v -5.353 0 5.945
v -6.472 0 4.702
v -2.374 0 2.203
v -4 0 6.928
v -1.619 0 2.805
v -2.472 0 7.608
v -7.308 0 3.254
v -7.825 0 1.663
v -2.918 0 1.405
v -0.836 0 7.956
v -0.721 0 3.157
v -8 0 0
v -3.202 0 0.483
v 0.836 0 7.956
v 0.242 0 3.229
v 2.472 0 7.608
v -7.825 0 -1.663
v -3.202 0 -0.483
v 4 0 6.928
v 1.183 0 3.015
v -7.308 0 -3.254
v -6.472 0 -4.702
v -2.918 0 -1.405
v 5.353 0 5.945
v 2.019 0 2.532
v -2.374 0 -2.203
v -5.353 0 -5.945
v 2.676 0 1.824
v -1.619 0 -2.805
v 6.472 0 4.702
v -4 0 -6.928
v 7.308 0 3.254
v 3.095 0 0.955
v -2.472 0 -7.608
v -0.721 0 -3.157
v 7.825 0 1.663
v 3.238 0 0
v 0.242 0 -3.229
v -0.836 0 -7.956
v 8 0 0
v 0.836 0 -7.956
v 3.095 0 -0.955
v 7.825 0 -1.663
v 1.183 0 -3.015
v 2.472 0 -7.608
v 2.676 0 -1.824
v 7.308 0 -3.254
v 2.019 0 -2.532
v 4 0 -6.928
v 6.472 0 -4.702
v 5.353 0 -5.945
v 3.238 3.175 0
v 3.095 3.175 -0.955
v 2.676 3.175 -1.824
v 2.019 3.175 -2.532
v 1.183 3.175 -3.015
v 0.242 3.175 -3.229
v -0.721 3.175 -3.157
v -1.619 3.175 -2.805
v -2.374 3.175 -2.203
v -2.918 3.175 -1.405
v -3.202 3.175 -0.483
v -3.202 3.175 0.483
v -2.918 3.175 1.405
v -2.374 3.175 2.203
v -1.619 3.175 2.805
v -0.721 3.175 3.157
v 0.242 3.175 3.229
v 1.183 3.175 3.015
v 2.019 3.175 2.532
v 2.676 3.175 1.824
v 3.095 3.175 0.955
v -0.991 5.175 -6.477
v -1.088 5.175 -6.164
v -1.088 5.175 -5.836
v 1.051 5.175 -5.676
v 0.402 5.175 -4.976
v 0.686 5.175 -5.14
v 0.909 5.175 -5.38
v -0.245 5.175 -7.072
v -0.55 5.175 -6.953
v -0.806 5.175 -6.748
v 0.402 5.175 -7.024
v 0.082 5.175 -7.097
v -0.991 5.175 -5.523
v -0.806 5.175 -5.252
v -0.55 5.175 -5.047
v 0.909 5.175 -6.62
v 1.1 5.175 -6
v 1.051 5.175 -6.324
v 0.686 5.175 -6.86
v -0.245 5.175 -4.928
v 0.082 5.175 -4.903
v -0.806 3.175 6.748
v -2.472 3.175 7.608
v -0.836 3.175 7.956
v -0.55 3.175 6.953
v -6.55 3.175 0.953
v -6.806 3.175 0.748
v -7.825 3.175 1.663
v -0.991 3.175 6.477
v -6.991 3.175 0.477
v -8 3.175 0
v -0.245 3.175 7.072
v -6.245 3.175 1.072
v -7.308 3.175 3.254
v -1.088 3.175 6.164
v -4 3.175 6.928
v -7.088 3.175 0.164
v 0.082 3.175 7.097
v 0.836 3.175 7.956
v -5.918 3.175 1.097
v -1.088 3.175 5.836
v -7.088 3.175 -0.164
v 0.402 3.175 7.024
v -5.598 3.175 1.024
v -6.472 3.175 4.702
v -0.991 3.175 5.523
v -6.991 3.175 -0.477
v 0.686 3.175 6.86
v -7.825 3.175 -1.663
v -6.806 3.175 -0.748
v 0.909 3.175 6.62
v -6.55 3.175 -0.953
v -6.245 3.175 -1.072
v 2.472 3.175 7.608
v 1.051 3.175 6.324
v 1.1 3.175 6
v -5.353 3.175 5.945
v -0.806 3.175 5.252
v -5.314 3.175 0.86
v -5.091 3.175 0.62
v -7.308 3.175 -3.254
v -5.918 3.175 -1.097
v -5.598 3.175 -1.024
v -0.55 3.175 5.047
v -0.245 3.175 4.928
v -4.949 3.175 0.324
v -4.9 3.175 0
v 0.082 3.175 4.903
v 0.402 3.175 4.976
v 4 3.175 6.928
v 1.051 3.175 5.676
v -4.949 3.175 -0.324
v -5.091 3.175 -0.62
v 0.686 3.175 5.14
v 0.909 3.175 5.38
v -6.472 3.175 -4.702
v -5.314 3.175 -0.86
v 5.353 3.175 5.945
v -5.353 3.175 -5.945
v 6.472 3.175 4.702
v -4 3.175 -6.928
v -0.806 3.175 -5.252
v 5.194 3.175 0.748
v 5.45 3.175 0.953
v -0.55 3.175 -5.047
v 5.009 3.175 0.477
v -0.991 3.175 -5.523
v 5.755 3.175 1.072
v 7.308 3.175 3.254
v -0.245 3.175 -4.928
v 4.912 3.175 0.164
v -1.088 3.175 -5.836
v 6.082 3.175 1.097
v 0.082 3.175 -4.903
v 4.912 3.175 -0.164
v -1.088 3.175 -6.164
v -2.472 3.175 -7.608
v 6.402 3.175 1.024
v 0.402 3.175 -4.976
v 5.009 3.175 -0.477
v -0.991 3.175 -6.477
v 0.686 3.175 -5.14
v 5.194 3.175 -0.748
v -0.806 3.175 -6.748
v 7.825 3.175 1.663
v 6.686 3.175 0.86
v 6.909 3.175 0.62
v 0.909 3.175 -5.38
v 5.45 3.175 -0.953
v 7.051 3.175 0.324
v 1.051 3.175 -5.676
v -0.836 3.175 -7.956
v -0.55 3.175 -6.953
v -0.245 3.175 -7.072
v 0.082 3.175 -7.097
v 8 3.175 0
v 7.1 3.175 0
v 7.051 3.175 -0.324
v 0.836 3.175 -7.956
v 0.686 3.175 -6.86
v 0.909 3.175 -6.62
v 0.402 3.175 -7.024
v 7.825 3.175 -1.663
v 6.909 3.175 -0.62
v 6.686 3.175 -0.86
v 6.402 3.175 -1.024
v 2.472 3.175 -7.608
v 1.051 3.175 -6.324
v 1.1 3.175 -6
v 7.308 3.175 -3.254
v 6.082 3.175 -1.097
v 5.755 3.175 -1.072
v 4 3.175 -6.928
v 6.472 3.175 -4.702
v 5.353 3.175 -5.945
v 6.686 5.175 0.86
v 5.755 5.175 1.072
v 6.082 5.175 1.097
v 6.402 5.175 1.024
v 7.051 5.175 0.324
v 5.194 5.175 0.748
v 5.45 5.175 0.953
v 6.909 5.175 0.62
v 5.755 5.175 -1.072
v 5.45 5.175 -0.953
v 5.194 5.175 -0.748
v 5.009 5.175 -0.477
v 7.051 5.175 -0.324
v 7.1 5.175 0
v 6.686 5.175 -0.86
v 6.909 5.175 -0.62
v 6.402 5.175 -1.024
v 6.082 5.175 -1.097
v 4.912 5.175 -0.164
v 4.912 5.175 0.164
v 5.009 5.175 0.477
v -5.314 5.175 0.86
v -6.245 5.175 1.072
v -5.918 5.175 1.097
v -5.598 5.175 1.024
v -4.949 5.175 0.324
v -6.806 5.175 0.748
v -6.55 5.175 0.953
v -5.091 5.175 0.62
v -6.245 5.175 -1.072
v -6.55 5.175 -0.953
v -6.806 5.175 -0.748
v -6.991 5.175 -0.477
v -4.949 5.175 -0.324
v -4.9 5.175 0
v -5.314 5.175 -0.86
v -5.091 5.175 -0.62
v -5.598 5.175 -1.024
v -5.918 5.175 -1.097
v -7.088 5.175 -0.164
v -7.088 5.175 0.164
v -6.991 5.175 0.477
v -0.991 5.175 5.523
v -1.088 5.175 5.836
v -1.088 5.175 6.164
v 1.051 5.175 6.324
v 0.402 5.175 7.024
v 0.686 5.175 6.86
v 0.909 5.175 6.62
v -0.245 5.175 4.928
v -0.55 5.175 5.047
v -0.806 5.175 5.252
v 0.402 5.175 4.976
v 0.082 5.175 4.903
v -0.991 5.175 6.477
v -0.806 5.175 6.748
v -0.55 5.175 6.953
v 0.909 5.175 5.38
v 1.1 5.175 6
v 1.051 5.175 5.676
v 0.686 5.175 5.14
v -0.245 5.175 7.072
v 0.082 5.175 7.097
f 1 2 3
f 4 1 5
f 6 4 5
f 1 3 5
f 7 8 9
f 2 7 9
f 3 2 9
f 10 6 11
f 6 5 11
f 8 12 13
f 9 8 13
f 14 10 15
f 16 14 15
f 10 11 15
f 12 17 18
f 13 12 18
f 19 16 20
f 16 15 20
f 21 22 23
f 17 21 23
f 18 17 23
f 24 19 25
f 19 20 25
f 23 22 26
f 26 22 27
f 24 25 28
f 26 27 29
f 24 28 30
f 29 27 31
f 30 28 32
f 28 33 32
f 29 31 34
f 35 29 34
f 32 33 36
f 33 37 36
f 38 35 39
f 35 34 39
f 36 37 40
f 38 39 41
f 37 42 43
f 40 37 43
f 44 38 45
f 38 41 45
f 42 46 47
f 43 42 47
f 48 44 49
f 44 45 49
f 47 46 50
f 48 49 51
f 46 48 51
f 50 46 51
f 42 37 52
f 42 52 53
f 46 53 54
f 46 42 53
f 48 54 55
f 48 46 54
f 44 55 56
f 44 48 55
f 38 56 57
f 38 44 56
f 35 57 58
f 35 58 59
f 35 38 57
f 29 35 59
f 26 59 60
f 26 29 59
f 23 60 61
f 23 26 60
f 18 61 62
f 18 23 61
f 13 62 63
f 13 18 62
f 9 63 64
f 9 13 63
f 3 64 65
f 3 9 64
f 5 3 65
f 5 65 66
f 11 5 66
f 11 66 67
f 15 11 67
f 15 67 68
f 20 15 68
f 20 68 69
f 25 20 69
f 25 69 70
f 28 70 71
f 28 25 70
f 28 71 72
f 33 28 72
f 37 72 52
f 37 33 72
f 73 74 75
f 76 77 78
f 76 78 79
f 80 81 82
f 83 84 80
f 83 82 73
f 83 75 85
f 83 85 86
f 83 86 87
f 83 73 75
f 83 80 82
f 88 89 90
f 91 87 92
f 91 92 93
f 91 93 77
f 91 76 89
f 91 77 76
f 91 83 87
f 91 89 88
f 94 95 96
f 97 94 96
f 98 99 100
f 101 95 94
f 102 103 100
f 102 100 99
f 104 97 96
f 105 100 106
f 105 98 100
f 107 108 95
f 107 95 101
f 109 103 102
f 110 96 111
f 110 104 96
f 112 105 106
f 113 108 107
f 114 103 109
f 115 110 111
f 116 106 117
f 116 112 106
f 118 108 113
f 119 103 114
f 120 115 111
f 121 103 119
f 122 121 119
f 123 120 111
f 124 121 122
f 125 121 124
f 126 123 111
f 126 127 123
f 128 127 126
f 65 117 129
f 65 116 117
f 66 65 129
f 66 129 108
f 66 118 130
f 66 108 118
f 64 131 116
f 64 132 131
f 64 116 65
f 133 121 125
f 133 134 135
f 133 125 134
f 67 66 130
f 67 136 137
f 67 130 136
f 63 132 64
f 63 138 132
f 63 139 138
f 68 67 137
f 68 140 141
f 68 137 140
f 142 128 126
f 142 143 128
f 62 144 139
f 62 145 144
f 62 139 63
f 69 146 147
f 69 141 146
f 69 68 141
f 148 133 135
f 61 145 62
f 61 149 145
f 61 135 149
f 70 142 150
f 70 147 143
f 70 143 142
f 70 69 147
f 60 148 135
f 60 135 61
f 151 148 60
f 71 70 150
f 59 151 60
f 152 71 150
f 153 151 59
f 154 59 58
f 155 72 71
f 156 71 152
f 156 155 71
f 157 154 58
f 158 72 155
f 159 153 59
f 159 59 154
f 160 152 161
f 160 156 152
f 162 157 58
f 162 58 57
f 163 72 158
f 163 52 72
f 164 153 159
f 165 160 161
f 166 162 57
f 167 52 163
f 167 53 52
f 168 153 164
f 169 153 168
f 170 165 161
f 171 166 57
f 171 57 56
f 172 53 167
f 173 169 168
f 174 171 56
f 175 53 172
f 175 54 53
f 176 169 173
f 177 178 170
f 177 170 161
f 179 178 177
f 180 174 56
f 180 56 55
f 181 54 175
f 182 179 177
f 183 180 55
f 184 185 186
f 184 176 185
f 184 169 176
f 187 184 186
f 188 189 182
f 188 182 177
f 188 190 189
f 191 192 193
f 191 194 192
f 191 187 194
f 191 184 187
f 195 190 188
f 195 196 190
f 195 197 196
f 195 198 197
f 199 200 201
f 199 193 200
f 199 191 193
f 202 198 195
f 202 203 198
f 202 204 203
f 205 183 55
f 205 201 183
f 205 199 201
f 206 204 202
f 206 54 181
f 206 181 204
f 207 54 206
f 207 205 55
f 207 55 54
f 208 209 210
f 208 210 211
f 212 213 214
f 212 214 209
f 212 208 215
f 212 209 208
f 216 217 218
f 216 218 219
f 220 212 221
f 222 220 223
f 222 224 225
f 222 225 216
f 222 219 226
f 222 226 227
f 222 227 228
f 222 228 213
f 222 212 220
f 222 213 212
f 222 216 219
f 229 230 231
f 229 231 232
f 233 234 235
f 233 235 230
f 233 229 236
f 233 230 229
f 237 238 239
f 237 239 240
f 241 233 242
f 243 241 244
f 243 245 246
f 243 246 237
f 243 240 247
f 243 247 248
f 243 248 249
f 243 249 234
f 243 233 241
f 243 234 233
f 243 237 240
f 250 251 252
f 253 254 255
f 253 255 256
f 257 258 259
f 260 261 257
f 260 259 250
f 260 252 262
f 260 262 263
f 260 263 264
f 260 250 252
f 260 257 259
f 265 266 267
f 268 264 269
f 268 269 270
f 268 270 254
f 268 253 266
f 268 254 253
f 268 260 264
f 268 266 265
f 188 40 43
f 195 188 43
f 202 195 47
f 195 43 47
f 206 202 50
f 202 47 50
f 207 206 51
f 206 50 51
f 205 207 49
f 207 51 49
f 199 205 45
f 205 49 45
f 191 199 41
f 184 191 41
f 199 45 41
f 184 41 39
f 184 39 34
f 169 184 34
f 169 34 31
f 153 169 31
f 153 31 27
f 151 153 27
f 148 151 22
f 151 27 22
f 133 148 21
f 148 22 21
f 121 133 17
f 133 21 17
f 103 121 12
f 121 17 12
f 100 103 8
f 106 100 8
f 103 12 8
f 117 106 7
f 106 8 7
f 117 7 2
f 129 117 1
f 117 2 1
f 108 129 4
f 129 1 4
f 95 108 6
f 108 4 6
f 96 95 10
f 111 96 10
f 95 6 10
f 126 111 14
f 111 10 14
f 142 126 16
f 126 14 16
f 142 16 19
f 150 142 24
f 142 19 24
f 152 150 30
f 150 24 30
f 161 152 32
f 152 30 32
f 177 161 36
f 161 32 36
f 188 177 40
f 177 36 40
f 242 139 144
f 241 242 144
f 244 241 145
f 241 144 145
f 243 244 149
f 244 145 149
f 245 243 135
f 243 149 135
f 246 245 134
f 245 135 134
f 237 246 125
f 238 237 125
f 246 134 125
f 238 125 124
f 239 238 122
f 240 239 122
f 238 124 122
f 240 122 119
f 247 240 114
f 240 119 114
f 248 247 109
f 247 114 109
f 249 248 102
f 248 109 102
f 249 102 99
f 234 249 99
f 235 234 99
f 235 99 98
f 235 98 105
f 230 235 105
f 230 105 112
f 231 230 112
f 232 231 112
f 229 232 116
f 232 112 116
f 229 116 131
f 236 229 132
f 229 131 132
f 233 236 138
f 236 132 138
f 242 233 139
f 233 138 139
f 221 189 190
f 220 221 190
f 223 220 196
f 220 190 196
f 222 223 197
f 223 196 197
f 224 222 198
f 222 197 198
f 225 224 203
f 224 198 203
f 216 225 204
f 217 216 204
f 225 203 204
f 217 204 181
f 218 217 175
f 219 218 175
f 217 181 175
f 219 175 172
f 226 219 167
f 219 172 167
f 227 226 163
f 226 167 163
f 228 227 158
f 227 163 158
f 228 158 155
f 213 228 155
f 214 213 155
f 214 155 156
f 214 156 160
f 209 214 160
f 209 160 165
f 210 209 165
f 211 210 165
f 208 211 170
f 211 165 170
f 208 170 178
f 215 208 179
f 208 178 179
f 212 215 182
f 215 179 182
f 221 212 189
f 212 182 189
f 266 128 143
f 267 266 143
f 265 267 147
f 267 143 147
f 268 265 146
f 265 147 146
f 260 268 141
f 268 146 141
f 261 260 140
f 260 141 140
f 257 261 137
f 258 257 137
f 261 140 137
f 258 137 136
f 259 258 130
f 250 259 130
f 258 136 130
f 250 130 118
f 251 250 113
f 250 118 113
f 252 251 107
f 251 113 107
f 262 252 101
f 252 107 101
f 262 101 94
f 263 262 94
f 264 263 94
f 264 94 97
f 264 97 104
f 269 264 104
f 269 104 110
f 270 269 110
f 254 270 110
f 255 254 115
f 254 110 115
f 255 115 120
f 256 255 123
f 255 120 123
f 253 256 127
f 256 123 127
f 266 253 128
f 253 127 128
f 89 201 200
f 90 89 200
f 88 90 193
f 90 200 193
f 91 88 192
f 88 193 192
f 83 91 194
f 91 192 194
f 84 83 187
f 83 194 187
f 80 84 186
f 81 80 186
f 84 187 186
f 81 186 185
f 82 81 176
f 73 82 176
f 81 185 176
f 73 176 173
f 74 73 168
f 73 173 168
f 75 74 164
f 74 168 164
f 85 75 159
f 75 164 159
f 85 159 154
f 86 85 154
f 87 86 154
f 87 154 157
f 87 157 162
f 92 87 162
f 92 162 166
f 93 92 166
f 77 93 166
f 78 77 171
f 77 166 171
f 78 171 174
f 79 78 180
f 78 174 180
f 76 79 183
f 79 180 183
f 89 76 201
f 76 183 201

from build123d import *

# Parameters (mm, degrees)
SKETCH1_R           = 8
SKETCH1_R_2         = 3.2385
BOSS_EXTRUDE1_DEPTH = 3.175
SKETCH2_R           = 1.1
BOSS_EXTRUDE2_DEPTH = 2


with BuildPart() as part:
    # Sketch1 → Boss-Extrude1 (new body)
    with BuildSketch(Plane(origin=(0, 0, 0), x_dir=(1, 0, 0), z_dir=(0, 1, 0))):
        Circle(SKETCH1_R)
        Circle(SKETCH1_R_2, mode=Mode.SUBTRACT)
    extrude(amount=BOSS_EXTRUDE1_DEPTH)

    # Sketch2 → Boss-Extrude2 (add)
    with BuildSketch(Plane(origin=(0, 3.175, 0), x_dir=(1, 0, 0), z_dir=(0, 1, 0))):
        with Locations((0, 6)):
            Circle(SKETCH2_R)
        with Locations((6, 0)):
            Circle(SKETCH2_R)
        with Locations((0, -6)):
            Circle(SKETCH2_R)
        with Locations((-6, 0)):
            Circle(SKETCH2_R)
    extrude(amount=BOSS_EXTRUDE2_DEPTH)


solid = part.part
